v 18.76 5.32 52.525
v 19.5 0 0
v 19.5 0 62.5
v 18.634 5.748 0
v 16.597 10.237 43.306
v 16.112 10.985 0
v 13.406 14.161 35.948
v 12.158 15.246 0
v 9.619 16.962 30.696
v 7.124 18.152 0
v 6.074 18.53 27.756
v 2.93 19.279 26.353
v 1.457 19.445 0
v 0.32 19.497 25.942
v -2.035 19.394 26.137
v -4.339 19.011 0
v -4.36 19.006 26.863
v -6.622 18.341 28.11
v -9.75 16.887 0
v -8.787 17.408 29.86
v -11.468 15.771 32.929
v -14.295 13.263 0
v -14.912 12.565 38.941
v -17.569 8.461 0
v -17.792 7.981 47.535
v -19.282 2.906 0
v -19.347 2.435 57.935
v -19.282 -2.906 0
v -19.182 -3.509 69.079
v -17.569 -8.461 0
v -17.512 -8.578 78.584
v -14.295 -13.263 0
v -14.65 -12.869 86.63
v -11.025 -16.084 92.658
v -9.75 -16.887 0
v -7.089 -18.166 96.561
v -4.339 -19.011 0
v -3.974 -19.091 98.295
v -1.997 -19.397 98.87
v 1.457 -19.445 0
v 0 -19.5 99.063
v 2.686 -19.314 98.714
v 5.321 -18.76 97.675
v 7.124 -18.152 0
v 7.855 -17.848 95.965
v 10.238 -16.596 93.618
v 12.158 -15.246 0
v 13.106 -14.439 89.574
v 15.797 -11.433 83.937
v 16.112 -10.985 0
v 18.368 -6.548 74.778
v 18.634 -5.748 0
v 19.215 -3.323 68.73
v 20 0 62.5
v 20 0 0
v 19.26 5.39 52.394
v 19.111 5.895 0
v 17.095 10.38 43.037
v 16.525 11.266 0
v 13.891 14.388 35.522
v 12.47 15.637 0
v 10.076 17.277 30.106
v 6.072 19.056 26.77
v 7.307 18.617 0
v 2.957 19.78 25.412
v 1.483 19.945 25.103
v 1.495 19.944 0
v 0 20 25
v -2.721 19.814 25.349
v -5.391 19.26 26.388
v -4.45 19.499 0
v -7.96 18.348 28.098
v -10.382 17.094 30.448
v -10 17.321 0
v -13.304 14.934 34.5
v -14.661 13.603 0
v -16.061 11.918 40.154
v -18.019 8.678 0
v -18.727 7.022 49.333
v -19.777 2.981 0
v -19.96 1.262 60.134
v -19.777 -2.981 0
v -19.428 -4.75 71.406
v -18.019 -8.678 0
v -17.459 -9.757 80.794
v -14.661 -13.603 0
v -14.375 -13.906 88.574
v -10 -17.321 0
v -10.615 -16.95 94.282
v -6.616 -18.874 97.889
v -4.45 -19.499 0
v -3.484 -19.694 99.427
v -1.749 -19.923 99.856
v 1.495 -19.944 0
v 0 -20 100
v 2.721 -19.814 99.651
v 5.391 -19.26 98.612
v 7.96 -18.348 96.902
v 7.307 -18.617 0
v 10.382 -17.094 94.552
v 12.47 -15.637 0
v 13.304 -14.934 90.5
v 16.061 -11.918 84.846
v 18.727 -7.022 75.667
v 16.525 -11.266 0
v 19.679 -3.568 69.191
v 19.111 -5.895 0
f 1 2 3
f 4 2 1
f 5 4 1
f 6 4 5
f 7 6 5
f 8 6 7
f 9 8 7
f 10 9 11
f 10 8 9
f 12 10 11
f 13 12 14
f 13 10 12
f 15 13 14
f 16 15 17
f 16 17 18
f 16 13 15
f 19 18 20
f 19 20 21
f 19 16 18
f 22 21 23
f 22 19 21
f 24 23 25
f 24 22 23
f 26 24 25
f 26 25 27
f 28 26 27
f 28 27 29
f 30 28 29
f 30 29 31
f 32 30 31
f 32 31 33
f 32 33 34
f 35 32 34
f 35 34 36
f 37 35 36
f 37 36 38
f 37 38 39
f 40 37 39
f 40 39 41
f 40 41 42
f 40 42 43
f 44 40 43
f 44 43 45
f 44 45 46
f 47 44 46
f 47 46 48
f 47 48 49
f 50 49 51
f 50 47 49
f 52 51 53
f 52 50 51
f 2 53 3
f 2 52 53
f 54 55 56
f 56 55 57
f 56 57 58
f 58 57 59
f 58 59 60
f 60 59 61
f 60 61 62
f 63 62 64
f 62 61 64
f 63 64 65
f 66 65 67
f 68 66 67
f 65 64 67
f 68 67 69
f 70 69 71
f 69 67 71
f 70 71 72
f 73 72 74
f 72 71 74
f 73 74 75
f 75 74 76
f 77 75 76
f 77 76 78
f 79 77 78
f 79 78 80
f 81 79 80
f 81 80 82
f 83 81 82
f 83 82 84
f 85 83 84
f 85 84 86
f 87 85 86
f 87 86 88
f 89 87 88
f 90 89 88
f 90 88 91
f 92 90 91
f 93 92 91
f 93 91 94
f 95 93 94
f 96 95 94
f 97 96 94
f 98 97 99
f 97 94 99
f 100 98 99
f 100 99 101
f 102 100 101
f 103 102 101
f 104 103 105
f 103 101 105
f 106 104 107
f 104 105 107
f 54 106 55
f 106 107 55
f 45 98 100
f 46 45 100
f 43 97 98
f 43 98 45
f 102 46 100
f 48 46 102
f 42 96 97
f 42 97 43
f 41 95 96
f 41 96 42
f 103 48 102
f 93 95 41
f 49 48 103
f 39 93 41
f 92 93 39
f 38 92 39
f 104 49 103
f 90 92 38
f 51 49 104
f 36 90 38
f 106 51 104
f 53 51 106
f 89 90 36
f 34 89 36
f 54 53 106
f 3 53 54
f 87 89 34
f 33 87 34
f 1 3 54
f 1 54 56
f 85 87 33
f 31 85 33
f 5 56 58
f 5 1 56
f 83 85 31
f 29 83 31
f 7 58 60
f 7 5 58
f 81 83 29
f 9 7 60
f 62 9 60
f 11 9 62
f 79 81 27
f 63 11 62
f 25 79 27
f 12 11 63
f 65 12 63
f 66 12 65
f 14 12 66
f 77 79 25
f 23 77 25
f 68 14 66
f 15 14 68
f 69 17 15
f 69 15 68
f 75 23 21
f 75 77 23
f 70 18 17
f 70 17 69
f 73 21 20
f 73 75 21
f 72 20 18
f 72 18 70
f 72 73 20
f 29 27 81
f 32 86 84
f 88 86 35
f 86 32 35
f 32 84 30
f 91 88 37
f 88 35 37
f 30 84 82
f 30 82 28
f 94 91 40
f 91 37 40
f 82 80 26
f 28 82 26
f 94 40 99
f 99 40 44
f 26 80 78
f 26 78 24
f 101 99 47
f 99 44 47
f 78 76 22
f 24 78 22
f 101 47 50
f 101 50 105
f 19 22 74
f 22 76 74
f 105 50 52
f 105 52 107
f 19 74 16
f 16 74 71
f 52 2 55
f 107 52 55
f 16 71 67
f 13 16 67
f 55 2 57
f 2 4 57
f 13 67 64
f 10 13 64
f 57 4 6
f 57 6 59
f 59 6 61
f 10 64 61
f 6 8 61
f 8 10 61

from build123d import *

# Parameters (mm, degrees)
SKETCH1_R               = 20
BOSS_EXTRUDE1_DEPTH     = 100
CUT_EXTRUDE1_DEPTH      = 104.923048454
CUT_EXTRUDE1_DEPTH_BACK = 104.923048454
SHELL1_OUTLINE_R        = 19.5
SHELL1_DEPTH            = 99.0625001


# Read off the part's stored shape, not the designer's step: Shell1
with BuildPart() as part:
    # Sketch1 → Boss-Extrude1 (new body)
    with BuildSketch(Plane.XY):
        Circle(SKETCH1_R)
    extrude(amount=BOSS_EXTRUDE1_DEPTH)

    # Sketch2 → Cut-Extrude1 (cut, two sides: drawn at the far end of the back side and taken through both)
    with BuildSketch(Plane(origin=(0, 0, 0), x_dir=(0, 0, -1), z_dir=(1, 0, 0)).offset(-CUT_EXTRUDE1_DEPTH_BACK)):
        Polygon((-100, -20), (-25, 20), (-100, 20), align=None)
    extrude(amount=CUT_EXTRUDE1_DEPTH + CUT_EXTRUDE1_DEPTH_BACK, mode=Mode.SUBTRACT)

    # Shell1 outline → Shell1 (cut)
    with BuildSketch(Plane.XY):
        Circle(SHELL1_OUTLINE_R)
    extrude(amount=SHELL1_DEPTH, mode=Mode.SUBTRACT)


solid = part.part
